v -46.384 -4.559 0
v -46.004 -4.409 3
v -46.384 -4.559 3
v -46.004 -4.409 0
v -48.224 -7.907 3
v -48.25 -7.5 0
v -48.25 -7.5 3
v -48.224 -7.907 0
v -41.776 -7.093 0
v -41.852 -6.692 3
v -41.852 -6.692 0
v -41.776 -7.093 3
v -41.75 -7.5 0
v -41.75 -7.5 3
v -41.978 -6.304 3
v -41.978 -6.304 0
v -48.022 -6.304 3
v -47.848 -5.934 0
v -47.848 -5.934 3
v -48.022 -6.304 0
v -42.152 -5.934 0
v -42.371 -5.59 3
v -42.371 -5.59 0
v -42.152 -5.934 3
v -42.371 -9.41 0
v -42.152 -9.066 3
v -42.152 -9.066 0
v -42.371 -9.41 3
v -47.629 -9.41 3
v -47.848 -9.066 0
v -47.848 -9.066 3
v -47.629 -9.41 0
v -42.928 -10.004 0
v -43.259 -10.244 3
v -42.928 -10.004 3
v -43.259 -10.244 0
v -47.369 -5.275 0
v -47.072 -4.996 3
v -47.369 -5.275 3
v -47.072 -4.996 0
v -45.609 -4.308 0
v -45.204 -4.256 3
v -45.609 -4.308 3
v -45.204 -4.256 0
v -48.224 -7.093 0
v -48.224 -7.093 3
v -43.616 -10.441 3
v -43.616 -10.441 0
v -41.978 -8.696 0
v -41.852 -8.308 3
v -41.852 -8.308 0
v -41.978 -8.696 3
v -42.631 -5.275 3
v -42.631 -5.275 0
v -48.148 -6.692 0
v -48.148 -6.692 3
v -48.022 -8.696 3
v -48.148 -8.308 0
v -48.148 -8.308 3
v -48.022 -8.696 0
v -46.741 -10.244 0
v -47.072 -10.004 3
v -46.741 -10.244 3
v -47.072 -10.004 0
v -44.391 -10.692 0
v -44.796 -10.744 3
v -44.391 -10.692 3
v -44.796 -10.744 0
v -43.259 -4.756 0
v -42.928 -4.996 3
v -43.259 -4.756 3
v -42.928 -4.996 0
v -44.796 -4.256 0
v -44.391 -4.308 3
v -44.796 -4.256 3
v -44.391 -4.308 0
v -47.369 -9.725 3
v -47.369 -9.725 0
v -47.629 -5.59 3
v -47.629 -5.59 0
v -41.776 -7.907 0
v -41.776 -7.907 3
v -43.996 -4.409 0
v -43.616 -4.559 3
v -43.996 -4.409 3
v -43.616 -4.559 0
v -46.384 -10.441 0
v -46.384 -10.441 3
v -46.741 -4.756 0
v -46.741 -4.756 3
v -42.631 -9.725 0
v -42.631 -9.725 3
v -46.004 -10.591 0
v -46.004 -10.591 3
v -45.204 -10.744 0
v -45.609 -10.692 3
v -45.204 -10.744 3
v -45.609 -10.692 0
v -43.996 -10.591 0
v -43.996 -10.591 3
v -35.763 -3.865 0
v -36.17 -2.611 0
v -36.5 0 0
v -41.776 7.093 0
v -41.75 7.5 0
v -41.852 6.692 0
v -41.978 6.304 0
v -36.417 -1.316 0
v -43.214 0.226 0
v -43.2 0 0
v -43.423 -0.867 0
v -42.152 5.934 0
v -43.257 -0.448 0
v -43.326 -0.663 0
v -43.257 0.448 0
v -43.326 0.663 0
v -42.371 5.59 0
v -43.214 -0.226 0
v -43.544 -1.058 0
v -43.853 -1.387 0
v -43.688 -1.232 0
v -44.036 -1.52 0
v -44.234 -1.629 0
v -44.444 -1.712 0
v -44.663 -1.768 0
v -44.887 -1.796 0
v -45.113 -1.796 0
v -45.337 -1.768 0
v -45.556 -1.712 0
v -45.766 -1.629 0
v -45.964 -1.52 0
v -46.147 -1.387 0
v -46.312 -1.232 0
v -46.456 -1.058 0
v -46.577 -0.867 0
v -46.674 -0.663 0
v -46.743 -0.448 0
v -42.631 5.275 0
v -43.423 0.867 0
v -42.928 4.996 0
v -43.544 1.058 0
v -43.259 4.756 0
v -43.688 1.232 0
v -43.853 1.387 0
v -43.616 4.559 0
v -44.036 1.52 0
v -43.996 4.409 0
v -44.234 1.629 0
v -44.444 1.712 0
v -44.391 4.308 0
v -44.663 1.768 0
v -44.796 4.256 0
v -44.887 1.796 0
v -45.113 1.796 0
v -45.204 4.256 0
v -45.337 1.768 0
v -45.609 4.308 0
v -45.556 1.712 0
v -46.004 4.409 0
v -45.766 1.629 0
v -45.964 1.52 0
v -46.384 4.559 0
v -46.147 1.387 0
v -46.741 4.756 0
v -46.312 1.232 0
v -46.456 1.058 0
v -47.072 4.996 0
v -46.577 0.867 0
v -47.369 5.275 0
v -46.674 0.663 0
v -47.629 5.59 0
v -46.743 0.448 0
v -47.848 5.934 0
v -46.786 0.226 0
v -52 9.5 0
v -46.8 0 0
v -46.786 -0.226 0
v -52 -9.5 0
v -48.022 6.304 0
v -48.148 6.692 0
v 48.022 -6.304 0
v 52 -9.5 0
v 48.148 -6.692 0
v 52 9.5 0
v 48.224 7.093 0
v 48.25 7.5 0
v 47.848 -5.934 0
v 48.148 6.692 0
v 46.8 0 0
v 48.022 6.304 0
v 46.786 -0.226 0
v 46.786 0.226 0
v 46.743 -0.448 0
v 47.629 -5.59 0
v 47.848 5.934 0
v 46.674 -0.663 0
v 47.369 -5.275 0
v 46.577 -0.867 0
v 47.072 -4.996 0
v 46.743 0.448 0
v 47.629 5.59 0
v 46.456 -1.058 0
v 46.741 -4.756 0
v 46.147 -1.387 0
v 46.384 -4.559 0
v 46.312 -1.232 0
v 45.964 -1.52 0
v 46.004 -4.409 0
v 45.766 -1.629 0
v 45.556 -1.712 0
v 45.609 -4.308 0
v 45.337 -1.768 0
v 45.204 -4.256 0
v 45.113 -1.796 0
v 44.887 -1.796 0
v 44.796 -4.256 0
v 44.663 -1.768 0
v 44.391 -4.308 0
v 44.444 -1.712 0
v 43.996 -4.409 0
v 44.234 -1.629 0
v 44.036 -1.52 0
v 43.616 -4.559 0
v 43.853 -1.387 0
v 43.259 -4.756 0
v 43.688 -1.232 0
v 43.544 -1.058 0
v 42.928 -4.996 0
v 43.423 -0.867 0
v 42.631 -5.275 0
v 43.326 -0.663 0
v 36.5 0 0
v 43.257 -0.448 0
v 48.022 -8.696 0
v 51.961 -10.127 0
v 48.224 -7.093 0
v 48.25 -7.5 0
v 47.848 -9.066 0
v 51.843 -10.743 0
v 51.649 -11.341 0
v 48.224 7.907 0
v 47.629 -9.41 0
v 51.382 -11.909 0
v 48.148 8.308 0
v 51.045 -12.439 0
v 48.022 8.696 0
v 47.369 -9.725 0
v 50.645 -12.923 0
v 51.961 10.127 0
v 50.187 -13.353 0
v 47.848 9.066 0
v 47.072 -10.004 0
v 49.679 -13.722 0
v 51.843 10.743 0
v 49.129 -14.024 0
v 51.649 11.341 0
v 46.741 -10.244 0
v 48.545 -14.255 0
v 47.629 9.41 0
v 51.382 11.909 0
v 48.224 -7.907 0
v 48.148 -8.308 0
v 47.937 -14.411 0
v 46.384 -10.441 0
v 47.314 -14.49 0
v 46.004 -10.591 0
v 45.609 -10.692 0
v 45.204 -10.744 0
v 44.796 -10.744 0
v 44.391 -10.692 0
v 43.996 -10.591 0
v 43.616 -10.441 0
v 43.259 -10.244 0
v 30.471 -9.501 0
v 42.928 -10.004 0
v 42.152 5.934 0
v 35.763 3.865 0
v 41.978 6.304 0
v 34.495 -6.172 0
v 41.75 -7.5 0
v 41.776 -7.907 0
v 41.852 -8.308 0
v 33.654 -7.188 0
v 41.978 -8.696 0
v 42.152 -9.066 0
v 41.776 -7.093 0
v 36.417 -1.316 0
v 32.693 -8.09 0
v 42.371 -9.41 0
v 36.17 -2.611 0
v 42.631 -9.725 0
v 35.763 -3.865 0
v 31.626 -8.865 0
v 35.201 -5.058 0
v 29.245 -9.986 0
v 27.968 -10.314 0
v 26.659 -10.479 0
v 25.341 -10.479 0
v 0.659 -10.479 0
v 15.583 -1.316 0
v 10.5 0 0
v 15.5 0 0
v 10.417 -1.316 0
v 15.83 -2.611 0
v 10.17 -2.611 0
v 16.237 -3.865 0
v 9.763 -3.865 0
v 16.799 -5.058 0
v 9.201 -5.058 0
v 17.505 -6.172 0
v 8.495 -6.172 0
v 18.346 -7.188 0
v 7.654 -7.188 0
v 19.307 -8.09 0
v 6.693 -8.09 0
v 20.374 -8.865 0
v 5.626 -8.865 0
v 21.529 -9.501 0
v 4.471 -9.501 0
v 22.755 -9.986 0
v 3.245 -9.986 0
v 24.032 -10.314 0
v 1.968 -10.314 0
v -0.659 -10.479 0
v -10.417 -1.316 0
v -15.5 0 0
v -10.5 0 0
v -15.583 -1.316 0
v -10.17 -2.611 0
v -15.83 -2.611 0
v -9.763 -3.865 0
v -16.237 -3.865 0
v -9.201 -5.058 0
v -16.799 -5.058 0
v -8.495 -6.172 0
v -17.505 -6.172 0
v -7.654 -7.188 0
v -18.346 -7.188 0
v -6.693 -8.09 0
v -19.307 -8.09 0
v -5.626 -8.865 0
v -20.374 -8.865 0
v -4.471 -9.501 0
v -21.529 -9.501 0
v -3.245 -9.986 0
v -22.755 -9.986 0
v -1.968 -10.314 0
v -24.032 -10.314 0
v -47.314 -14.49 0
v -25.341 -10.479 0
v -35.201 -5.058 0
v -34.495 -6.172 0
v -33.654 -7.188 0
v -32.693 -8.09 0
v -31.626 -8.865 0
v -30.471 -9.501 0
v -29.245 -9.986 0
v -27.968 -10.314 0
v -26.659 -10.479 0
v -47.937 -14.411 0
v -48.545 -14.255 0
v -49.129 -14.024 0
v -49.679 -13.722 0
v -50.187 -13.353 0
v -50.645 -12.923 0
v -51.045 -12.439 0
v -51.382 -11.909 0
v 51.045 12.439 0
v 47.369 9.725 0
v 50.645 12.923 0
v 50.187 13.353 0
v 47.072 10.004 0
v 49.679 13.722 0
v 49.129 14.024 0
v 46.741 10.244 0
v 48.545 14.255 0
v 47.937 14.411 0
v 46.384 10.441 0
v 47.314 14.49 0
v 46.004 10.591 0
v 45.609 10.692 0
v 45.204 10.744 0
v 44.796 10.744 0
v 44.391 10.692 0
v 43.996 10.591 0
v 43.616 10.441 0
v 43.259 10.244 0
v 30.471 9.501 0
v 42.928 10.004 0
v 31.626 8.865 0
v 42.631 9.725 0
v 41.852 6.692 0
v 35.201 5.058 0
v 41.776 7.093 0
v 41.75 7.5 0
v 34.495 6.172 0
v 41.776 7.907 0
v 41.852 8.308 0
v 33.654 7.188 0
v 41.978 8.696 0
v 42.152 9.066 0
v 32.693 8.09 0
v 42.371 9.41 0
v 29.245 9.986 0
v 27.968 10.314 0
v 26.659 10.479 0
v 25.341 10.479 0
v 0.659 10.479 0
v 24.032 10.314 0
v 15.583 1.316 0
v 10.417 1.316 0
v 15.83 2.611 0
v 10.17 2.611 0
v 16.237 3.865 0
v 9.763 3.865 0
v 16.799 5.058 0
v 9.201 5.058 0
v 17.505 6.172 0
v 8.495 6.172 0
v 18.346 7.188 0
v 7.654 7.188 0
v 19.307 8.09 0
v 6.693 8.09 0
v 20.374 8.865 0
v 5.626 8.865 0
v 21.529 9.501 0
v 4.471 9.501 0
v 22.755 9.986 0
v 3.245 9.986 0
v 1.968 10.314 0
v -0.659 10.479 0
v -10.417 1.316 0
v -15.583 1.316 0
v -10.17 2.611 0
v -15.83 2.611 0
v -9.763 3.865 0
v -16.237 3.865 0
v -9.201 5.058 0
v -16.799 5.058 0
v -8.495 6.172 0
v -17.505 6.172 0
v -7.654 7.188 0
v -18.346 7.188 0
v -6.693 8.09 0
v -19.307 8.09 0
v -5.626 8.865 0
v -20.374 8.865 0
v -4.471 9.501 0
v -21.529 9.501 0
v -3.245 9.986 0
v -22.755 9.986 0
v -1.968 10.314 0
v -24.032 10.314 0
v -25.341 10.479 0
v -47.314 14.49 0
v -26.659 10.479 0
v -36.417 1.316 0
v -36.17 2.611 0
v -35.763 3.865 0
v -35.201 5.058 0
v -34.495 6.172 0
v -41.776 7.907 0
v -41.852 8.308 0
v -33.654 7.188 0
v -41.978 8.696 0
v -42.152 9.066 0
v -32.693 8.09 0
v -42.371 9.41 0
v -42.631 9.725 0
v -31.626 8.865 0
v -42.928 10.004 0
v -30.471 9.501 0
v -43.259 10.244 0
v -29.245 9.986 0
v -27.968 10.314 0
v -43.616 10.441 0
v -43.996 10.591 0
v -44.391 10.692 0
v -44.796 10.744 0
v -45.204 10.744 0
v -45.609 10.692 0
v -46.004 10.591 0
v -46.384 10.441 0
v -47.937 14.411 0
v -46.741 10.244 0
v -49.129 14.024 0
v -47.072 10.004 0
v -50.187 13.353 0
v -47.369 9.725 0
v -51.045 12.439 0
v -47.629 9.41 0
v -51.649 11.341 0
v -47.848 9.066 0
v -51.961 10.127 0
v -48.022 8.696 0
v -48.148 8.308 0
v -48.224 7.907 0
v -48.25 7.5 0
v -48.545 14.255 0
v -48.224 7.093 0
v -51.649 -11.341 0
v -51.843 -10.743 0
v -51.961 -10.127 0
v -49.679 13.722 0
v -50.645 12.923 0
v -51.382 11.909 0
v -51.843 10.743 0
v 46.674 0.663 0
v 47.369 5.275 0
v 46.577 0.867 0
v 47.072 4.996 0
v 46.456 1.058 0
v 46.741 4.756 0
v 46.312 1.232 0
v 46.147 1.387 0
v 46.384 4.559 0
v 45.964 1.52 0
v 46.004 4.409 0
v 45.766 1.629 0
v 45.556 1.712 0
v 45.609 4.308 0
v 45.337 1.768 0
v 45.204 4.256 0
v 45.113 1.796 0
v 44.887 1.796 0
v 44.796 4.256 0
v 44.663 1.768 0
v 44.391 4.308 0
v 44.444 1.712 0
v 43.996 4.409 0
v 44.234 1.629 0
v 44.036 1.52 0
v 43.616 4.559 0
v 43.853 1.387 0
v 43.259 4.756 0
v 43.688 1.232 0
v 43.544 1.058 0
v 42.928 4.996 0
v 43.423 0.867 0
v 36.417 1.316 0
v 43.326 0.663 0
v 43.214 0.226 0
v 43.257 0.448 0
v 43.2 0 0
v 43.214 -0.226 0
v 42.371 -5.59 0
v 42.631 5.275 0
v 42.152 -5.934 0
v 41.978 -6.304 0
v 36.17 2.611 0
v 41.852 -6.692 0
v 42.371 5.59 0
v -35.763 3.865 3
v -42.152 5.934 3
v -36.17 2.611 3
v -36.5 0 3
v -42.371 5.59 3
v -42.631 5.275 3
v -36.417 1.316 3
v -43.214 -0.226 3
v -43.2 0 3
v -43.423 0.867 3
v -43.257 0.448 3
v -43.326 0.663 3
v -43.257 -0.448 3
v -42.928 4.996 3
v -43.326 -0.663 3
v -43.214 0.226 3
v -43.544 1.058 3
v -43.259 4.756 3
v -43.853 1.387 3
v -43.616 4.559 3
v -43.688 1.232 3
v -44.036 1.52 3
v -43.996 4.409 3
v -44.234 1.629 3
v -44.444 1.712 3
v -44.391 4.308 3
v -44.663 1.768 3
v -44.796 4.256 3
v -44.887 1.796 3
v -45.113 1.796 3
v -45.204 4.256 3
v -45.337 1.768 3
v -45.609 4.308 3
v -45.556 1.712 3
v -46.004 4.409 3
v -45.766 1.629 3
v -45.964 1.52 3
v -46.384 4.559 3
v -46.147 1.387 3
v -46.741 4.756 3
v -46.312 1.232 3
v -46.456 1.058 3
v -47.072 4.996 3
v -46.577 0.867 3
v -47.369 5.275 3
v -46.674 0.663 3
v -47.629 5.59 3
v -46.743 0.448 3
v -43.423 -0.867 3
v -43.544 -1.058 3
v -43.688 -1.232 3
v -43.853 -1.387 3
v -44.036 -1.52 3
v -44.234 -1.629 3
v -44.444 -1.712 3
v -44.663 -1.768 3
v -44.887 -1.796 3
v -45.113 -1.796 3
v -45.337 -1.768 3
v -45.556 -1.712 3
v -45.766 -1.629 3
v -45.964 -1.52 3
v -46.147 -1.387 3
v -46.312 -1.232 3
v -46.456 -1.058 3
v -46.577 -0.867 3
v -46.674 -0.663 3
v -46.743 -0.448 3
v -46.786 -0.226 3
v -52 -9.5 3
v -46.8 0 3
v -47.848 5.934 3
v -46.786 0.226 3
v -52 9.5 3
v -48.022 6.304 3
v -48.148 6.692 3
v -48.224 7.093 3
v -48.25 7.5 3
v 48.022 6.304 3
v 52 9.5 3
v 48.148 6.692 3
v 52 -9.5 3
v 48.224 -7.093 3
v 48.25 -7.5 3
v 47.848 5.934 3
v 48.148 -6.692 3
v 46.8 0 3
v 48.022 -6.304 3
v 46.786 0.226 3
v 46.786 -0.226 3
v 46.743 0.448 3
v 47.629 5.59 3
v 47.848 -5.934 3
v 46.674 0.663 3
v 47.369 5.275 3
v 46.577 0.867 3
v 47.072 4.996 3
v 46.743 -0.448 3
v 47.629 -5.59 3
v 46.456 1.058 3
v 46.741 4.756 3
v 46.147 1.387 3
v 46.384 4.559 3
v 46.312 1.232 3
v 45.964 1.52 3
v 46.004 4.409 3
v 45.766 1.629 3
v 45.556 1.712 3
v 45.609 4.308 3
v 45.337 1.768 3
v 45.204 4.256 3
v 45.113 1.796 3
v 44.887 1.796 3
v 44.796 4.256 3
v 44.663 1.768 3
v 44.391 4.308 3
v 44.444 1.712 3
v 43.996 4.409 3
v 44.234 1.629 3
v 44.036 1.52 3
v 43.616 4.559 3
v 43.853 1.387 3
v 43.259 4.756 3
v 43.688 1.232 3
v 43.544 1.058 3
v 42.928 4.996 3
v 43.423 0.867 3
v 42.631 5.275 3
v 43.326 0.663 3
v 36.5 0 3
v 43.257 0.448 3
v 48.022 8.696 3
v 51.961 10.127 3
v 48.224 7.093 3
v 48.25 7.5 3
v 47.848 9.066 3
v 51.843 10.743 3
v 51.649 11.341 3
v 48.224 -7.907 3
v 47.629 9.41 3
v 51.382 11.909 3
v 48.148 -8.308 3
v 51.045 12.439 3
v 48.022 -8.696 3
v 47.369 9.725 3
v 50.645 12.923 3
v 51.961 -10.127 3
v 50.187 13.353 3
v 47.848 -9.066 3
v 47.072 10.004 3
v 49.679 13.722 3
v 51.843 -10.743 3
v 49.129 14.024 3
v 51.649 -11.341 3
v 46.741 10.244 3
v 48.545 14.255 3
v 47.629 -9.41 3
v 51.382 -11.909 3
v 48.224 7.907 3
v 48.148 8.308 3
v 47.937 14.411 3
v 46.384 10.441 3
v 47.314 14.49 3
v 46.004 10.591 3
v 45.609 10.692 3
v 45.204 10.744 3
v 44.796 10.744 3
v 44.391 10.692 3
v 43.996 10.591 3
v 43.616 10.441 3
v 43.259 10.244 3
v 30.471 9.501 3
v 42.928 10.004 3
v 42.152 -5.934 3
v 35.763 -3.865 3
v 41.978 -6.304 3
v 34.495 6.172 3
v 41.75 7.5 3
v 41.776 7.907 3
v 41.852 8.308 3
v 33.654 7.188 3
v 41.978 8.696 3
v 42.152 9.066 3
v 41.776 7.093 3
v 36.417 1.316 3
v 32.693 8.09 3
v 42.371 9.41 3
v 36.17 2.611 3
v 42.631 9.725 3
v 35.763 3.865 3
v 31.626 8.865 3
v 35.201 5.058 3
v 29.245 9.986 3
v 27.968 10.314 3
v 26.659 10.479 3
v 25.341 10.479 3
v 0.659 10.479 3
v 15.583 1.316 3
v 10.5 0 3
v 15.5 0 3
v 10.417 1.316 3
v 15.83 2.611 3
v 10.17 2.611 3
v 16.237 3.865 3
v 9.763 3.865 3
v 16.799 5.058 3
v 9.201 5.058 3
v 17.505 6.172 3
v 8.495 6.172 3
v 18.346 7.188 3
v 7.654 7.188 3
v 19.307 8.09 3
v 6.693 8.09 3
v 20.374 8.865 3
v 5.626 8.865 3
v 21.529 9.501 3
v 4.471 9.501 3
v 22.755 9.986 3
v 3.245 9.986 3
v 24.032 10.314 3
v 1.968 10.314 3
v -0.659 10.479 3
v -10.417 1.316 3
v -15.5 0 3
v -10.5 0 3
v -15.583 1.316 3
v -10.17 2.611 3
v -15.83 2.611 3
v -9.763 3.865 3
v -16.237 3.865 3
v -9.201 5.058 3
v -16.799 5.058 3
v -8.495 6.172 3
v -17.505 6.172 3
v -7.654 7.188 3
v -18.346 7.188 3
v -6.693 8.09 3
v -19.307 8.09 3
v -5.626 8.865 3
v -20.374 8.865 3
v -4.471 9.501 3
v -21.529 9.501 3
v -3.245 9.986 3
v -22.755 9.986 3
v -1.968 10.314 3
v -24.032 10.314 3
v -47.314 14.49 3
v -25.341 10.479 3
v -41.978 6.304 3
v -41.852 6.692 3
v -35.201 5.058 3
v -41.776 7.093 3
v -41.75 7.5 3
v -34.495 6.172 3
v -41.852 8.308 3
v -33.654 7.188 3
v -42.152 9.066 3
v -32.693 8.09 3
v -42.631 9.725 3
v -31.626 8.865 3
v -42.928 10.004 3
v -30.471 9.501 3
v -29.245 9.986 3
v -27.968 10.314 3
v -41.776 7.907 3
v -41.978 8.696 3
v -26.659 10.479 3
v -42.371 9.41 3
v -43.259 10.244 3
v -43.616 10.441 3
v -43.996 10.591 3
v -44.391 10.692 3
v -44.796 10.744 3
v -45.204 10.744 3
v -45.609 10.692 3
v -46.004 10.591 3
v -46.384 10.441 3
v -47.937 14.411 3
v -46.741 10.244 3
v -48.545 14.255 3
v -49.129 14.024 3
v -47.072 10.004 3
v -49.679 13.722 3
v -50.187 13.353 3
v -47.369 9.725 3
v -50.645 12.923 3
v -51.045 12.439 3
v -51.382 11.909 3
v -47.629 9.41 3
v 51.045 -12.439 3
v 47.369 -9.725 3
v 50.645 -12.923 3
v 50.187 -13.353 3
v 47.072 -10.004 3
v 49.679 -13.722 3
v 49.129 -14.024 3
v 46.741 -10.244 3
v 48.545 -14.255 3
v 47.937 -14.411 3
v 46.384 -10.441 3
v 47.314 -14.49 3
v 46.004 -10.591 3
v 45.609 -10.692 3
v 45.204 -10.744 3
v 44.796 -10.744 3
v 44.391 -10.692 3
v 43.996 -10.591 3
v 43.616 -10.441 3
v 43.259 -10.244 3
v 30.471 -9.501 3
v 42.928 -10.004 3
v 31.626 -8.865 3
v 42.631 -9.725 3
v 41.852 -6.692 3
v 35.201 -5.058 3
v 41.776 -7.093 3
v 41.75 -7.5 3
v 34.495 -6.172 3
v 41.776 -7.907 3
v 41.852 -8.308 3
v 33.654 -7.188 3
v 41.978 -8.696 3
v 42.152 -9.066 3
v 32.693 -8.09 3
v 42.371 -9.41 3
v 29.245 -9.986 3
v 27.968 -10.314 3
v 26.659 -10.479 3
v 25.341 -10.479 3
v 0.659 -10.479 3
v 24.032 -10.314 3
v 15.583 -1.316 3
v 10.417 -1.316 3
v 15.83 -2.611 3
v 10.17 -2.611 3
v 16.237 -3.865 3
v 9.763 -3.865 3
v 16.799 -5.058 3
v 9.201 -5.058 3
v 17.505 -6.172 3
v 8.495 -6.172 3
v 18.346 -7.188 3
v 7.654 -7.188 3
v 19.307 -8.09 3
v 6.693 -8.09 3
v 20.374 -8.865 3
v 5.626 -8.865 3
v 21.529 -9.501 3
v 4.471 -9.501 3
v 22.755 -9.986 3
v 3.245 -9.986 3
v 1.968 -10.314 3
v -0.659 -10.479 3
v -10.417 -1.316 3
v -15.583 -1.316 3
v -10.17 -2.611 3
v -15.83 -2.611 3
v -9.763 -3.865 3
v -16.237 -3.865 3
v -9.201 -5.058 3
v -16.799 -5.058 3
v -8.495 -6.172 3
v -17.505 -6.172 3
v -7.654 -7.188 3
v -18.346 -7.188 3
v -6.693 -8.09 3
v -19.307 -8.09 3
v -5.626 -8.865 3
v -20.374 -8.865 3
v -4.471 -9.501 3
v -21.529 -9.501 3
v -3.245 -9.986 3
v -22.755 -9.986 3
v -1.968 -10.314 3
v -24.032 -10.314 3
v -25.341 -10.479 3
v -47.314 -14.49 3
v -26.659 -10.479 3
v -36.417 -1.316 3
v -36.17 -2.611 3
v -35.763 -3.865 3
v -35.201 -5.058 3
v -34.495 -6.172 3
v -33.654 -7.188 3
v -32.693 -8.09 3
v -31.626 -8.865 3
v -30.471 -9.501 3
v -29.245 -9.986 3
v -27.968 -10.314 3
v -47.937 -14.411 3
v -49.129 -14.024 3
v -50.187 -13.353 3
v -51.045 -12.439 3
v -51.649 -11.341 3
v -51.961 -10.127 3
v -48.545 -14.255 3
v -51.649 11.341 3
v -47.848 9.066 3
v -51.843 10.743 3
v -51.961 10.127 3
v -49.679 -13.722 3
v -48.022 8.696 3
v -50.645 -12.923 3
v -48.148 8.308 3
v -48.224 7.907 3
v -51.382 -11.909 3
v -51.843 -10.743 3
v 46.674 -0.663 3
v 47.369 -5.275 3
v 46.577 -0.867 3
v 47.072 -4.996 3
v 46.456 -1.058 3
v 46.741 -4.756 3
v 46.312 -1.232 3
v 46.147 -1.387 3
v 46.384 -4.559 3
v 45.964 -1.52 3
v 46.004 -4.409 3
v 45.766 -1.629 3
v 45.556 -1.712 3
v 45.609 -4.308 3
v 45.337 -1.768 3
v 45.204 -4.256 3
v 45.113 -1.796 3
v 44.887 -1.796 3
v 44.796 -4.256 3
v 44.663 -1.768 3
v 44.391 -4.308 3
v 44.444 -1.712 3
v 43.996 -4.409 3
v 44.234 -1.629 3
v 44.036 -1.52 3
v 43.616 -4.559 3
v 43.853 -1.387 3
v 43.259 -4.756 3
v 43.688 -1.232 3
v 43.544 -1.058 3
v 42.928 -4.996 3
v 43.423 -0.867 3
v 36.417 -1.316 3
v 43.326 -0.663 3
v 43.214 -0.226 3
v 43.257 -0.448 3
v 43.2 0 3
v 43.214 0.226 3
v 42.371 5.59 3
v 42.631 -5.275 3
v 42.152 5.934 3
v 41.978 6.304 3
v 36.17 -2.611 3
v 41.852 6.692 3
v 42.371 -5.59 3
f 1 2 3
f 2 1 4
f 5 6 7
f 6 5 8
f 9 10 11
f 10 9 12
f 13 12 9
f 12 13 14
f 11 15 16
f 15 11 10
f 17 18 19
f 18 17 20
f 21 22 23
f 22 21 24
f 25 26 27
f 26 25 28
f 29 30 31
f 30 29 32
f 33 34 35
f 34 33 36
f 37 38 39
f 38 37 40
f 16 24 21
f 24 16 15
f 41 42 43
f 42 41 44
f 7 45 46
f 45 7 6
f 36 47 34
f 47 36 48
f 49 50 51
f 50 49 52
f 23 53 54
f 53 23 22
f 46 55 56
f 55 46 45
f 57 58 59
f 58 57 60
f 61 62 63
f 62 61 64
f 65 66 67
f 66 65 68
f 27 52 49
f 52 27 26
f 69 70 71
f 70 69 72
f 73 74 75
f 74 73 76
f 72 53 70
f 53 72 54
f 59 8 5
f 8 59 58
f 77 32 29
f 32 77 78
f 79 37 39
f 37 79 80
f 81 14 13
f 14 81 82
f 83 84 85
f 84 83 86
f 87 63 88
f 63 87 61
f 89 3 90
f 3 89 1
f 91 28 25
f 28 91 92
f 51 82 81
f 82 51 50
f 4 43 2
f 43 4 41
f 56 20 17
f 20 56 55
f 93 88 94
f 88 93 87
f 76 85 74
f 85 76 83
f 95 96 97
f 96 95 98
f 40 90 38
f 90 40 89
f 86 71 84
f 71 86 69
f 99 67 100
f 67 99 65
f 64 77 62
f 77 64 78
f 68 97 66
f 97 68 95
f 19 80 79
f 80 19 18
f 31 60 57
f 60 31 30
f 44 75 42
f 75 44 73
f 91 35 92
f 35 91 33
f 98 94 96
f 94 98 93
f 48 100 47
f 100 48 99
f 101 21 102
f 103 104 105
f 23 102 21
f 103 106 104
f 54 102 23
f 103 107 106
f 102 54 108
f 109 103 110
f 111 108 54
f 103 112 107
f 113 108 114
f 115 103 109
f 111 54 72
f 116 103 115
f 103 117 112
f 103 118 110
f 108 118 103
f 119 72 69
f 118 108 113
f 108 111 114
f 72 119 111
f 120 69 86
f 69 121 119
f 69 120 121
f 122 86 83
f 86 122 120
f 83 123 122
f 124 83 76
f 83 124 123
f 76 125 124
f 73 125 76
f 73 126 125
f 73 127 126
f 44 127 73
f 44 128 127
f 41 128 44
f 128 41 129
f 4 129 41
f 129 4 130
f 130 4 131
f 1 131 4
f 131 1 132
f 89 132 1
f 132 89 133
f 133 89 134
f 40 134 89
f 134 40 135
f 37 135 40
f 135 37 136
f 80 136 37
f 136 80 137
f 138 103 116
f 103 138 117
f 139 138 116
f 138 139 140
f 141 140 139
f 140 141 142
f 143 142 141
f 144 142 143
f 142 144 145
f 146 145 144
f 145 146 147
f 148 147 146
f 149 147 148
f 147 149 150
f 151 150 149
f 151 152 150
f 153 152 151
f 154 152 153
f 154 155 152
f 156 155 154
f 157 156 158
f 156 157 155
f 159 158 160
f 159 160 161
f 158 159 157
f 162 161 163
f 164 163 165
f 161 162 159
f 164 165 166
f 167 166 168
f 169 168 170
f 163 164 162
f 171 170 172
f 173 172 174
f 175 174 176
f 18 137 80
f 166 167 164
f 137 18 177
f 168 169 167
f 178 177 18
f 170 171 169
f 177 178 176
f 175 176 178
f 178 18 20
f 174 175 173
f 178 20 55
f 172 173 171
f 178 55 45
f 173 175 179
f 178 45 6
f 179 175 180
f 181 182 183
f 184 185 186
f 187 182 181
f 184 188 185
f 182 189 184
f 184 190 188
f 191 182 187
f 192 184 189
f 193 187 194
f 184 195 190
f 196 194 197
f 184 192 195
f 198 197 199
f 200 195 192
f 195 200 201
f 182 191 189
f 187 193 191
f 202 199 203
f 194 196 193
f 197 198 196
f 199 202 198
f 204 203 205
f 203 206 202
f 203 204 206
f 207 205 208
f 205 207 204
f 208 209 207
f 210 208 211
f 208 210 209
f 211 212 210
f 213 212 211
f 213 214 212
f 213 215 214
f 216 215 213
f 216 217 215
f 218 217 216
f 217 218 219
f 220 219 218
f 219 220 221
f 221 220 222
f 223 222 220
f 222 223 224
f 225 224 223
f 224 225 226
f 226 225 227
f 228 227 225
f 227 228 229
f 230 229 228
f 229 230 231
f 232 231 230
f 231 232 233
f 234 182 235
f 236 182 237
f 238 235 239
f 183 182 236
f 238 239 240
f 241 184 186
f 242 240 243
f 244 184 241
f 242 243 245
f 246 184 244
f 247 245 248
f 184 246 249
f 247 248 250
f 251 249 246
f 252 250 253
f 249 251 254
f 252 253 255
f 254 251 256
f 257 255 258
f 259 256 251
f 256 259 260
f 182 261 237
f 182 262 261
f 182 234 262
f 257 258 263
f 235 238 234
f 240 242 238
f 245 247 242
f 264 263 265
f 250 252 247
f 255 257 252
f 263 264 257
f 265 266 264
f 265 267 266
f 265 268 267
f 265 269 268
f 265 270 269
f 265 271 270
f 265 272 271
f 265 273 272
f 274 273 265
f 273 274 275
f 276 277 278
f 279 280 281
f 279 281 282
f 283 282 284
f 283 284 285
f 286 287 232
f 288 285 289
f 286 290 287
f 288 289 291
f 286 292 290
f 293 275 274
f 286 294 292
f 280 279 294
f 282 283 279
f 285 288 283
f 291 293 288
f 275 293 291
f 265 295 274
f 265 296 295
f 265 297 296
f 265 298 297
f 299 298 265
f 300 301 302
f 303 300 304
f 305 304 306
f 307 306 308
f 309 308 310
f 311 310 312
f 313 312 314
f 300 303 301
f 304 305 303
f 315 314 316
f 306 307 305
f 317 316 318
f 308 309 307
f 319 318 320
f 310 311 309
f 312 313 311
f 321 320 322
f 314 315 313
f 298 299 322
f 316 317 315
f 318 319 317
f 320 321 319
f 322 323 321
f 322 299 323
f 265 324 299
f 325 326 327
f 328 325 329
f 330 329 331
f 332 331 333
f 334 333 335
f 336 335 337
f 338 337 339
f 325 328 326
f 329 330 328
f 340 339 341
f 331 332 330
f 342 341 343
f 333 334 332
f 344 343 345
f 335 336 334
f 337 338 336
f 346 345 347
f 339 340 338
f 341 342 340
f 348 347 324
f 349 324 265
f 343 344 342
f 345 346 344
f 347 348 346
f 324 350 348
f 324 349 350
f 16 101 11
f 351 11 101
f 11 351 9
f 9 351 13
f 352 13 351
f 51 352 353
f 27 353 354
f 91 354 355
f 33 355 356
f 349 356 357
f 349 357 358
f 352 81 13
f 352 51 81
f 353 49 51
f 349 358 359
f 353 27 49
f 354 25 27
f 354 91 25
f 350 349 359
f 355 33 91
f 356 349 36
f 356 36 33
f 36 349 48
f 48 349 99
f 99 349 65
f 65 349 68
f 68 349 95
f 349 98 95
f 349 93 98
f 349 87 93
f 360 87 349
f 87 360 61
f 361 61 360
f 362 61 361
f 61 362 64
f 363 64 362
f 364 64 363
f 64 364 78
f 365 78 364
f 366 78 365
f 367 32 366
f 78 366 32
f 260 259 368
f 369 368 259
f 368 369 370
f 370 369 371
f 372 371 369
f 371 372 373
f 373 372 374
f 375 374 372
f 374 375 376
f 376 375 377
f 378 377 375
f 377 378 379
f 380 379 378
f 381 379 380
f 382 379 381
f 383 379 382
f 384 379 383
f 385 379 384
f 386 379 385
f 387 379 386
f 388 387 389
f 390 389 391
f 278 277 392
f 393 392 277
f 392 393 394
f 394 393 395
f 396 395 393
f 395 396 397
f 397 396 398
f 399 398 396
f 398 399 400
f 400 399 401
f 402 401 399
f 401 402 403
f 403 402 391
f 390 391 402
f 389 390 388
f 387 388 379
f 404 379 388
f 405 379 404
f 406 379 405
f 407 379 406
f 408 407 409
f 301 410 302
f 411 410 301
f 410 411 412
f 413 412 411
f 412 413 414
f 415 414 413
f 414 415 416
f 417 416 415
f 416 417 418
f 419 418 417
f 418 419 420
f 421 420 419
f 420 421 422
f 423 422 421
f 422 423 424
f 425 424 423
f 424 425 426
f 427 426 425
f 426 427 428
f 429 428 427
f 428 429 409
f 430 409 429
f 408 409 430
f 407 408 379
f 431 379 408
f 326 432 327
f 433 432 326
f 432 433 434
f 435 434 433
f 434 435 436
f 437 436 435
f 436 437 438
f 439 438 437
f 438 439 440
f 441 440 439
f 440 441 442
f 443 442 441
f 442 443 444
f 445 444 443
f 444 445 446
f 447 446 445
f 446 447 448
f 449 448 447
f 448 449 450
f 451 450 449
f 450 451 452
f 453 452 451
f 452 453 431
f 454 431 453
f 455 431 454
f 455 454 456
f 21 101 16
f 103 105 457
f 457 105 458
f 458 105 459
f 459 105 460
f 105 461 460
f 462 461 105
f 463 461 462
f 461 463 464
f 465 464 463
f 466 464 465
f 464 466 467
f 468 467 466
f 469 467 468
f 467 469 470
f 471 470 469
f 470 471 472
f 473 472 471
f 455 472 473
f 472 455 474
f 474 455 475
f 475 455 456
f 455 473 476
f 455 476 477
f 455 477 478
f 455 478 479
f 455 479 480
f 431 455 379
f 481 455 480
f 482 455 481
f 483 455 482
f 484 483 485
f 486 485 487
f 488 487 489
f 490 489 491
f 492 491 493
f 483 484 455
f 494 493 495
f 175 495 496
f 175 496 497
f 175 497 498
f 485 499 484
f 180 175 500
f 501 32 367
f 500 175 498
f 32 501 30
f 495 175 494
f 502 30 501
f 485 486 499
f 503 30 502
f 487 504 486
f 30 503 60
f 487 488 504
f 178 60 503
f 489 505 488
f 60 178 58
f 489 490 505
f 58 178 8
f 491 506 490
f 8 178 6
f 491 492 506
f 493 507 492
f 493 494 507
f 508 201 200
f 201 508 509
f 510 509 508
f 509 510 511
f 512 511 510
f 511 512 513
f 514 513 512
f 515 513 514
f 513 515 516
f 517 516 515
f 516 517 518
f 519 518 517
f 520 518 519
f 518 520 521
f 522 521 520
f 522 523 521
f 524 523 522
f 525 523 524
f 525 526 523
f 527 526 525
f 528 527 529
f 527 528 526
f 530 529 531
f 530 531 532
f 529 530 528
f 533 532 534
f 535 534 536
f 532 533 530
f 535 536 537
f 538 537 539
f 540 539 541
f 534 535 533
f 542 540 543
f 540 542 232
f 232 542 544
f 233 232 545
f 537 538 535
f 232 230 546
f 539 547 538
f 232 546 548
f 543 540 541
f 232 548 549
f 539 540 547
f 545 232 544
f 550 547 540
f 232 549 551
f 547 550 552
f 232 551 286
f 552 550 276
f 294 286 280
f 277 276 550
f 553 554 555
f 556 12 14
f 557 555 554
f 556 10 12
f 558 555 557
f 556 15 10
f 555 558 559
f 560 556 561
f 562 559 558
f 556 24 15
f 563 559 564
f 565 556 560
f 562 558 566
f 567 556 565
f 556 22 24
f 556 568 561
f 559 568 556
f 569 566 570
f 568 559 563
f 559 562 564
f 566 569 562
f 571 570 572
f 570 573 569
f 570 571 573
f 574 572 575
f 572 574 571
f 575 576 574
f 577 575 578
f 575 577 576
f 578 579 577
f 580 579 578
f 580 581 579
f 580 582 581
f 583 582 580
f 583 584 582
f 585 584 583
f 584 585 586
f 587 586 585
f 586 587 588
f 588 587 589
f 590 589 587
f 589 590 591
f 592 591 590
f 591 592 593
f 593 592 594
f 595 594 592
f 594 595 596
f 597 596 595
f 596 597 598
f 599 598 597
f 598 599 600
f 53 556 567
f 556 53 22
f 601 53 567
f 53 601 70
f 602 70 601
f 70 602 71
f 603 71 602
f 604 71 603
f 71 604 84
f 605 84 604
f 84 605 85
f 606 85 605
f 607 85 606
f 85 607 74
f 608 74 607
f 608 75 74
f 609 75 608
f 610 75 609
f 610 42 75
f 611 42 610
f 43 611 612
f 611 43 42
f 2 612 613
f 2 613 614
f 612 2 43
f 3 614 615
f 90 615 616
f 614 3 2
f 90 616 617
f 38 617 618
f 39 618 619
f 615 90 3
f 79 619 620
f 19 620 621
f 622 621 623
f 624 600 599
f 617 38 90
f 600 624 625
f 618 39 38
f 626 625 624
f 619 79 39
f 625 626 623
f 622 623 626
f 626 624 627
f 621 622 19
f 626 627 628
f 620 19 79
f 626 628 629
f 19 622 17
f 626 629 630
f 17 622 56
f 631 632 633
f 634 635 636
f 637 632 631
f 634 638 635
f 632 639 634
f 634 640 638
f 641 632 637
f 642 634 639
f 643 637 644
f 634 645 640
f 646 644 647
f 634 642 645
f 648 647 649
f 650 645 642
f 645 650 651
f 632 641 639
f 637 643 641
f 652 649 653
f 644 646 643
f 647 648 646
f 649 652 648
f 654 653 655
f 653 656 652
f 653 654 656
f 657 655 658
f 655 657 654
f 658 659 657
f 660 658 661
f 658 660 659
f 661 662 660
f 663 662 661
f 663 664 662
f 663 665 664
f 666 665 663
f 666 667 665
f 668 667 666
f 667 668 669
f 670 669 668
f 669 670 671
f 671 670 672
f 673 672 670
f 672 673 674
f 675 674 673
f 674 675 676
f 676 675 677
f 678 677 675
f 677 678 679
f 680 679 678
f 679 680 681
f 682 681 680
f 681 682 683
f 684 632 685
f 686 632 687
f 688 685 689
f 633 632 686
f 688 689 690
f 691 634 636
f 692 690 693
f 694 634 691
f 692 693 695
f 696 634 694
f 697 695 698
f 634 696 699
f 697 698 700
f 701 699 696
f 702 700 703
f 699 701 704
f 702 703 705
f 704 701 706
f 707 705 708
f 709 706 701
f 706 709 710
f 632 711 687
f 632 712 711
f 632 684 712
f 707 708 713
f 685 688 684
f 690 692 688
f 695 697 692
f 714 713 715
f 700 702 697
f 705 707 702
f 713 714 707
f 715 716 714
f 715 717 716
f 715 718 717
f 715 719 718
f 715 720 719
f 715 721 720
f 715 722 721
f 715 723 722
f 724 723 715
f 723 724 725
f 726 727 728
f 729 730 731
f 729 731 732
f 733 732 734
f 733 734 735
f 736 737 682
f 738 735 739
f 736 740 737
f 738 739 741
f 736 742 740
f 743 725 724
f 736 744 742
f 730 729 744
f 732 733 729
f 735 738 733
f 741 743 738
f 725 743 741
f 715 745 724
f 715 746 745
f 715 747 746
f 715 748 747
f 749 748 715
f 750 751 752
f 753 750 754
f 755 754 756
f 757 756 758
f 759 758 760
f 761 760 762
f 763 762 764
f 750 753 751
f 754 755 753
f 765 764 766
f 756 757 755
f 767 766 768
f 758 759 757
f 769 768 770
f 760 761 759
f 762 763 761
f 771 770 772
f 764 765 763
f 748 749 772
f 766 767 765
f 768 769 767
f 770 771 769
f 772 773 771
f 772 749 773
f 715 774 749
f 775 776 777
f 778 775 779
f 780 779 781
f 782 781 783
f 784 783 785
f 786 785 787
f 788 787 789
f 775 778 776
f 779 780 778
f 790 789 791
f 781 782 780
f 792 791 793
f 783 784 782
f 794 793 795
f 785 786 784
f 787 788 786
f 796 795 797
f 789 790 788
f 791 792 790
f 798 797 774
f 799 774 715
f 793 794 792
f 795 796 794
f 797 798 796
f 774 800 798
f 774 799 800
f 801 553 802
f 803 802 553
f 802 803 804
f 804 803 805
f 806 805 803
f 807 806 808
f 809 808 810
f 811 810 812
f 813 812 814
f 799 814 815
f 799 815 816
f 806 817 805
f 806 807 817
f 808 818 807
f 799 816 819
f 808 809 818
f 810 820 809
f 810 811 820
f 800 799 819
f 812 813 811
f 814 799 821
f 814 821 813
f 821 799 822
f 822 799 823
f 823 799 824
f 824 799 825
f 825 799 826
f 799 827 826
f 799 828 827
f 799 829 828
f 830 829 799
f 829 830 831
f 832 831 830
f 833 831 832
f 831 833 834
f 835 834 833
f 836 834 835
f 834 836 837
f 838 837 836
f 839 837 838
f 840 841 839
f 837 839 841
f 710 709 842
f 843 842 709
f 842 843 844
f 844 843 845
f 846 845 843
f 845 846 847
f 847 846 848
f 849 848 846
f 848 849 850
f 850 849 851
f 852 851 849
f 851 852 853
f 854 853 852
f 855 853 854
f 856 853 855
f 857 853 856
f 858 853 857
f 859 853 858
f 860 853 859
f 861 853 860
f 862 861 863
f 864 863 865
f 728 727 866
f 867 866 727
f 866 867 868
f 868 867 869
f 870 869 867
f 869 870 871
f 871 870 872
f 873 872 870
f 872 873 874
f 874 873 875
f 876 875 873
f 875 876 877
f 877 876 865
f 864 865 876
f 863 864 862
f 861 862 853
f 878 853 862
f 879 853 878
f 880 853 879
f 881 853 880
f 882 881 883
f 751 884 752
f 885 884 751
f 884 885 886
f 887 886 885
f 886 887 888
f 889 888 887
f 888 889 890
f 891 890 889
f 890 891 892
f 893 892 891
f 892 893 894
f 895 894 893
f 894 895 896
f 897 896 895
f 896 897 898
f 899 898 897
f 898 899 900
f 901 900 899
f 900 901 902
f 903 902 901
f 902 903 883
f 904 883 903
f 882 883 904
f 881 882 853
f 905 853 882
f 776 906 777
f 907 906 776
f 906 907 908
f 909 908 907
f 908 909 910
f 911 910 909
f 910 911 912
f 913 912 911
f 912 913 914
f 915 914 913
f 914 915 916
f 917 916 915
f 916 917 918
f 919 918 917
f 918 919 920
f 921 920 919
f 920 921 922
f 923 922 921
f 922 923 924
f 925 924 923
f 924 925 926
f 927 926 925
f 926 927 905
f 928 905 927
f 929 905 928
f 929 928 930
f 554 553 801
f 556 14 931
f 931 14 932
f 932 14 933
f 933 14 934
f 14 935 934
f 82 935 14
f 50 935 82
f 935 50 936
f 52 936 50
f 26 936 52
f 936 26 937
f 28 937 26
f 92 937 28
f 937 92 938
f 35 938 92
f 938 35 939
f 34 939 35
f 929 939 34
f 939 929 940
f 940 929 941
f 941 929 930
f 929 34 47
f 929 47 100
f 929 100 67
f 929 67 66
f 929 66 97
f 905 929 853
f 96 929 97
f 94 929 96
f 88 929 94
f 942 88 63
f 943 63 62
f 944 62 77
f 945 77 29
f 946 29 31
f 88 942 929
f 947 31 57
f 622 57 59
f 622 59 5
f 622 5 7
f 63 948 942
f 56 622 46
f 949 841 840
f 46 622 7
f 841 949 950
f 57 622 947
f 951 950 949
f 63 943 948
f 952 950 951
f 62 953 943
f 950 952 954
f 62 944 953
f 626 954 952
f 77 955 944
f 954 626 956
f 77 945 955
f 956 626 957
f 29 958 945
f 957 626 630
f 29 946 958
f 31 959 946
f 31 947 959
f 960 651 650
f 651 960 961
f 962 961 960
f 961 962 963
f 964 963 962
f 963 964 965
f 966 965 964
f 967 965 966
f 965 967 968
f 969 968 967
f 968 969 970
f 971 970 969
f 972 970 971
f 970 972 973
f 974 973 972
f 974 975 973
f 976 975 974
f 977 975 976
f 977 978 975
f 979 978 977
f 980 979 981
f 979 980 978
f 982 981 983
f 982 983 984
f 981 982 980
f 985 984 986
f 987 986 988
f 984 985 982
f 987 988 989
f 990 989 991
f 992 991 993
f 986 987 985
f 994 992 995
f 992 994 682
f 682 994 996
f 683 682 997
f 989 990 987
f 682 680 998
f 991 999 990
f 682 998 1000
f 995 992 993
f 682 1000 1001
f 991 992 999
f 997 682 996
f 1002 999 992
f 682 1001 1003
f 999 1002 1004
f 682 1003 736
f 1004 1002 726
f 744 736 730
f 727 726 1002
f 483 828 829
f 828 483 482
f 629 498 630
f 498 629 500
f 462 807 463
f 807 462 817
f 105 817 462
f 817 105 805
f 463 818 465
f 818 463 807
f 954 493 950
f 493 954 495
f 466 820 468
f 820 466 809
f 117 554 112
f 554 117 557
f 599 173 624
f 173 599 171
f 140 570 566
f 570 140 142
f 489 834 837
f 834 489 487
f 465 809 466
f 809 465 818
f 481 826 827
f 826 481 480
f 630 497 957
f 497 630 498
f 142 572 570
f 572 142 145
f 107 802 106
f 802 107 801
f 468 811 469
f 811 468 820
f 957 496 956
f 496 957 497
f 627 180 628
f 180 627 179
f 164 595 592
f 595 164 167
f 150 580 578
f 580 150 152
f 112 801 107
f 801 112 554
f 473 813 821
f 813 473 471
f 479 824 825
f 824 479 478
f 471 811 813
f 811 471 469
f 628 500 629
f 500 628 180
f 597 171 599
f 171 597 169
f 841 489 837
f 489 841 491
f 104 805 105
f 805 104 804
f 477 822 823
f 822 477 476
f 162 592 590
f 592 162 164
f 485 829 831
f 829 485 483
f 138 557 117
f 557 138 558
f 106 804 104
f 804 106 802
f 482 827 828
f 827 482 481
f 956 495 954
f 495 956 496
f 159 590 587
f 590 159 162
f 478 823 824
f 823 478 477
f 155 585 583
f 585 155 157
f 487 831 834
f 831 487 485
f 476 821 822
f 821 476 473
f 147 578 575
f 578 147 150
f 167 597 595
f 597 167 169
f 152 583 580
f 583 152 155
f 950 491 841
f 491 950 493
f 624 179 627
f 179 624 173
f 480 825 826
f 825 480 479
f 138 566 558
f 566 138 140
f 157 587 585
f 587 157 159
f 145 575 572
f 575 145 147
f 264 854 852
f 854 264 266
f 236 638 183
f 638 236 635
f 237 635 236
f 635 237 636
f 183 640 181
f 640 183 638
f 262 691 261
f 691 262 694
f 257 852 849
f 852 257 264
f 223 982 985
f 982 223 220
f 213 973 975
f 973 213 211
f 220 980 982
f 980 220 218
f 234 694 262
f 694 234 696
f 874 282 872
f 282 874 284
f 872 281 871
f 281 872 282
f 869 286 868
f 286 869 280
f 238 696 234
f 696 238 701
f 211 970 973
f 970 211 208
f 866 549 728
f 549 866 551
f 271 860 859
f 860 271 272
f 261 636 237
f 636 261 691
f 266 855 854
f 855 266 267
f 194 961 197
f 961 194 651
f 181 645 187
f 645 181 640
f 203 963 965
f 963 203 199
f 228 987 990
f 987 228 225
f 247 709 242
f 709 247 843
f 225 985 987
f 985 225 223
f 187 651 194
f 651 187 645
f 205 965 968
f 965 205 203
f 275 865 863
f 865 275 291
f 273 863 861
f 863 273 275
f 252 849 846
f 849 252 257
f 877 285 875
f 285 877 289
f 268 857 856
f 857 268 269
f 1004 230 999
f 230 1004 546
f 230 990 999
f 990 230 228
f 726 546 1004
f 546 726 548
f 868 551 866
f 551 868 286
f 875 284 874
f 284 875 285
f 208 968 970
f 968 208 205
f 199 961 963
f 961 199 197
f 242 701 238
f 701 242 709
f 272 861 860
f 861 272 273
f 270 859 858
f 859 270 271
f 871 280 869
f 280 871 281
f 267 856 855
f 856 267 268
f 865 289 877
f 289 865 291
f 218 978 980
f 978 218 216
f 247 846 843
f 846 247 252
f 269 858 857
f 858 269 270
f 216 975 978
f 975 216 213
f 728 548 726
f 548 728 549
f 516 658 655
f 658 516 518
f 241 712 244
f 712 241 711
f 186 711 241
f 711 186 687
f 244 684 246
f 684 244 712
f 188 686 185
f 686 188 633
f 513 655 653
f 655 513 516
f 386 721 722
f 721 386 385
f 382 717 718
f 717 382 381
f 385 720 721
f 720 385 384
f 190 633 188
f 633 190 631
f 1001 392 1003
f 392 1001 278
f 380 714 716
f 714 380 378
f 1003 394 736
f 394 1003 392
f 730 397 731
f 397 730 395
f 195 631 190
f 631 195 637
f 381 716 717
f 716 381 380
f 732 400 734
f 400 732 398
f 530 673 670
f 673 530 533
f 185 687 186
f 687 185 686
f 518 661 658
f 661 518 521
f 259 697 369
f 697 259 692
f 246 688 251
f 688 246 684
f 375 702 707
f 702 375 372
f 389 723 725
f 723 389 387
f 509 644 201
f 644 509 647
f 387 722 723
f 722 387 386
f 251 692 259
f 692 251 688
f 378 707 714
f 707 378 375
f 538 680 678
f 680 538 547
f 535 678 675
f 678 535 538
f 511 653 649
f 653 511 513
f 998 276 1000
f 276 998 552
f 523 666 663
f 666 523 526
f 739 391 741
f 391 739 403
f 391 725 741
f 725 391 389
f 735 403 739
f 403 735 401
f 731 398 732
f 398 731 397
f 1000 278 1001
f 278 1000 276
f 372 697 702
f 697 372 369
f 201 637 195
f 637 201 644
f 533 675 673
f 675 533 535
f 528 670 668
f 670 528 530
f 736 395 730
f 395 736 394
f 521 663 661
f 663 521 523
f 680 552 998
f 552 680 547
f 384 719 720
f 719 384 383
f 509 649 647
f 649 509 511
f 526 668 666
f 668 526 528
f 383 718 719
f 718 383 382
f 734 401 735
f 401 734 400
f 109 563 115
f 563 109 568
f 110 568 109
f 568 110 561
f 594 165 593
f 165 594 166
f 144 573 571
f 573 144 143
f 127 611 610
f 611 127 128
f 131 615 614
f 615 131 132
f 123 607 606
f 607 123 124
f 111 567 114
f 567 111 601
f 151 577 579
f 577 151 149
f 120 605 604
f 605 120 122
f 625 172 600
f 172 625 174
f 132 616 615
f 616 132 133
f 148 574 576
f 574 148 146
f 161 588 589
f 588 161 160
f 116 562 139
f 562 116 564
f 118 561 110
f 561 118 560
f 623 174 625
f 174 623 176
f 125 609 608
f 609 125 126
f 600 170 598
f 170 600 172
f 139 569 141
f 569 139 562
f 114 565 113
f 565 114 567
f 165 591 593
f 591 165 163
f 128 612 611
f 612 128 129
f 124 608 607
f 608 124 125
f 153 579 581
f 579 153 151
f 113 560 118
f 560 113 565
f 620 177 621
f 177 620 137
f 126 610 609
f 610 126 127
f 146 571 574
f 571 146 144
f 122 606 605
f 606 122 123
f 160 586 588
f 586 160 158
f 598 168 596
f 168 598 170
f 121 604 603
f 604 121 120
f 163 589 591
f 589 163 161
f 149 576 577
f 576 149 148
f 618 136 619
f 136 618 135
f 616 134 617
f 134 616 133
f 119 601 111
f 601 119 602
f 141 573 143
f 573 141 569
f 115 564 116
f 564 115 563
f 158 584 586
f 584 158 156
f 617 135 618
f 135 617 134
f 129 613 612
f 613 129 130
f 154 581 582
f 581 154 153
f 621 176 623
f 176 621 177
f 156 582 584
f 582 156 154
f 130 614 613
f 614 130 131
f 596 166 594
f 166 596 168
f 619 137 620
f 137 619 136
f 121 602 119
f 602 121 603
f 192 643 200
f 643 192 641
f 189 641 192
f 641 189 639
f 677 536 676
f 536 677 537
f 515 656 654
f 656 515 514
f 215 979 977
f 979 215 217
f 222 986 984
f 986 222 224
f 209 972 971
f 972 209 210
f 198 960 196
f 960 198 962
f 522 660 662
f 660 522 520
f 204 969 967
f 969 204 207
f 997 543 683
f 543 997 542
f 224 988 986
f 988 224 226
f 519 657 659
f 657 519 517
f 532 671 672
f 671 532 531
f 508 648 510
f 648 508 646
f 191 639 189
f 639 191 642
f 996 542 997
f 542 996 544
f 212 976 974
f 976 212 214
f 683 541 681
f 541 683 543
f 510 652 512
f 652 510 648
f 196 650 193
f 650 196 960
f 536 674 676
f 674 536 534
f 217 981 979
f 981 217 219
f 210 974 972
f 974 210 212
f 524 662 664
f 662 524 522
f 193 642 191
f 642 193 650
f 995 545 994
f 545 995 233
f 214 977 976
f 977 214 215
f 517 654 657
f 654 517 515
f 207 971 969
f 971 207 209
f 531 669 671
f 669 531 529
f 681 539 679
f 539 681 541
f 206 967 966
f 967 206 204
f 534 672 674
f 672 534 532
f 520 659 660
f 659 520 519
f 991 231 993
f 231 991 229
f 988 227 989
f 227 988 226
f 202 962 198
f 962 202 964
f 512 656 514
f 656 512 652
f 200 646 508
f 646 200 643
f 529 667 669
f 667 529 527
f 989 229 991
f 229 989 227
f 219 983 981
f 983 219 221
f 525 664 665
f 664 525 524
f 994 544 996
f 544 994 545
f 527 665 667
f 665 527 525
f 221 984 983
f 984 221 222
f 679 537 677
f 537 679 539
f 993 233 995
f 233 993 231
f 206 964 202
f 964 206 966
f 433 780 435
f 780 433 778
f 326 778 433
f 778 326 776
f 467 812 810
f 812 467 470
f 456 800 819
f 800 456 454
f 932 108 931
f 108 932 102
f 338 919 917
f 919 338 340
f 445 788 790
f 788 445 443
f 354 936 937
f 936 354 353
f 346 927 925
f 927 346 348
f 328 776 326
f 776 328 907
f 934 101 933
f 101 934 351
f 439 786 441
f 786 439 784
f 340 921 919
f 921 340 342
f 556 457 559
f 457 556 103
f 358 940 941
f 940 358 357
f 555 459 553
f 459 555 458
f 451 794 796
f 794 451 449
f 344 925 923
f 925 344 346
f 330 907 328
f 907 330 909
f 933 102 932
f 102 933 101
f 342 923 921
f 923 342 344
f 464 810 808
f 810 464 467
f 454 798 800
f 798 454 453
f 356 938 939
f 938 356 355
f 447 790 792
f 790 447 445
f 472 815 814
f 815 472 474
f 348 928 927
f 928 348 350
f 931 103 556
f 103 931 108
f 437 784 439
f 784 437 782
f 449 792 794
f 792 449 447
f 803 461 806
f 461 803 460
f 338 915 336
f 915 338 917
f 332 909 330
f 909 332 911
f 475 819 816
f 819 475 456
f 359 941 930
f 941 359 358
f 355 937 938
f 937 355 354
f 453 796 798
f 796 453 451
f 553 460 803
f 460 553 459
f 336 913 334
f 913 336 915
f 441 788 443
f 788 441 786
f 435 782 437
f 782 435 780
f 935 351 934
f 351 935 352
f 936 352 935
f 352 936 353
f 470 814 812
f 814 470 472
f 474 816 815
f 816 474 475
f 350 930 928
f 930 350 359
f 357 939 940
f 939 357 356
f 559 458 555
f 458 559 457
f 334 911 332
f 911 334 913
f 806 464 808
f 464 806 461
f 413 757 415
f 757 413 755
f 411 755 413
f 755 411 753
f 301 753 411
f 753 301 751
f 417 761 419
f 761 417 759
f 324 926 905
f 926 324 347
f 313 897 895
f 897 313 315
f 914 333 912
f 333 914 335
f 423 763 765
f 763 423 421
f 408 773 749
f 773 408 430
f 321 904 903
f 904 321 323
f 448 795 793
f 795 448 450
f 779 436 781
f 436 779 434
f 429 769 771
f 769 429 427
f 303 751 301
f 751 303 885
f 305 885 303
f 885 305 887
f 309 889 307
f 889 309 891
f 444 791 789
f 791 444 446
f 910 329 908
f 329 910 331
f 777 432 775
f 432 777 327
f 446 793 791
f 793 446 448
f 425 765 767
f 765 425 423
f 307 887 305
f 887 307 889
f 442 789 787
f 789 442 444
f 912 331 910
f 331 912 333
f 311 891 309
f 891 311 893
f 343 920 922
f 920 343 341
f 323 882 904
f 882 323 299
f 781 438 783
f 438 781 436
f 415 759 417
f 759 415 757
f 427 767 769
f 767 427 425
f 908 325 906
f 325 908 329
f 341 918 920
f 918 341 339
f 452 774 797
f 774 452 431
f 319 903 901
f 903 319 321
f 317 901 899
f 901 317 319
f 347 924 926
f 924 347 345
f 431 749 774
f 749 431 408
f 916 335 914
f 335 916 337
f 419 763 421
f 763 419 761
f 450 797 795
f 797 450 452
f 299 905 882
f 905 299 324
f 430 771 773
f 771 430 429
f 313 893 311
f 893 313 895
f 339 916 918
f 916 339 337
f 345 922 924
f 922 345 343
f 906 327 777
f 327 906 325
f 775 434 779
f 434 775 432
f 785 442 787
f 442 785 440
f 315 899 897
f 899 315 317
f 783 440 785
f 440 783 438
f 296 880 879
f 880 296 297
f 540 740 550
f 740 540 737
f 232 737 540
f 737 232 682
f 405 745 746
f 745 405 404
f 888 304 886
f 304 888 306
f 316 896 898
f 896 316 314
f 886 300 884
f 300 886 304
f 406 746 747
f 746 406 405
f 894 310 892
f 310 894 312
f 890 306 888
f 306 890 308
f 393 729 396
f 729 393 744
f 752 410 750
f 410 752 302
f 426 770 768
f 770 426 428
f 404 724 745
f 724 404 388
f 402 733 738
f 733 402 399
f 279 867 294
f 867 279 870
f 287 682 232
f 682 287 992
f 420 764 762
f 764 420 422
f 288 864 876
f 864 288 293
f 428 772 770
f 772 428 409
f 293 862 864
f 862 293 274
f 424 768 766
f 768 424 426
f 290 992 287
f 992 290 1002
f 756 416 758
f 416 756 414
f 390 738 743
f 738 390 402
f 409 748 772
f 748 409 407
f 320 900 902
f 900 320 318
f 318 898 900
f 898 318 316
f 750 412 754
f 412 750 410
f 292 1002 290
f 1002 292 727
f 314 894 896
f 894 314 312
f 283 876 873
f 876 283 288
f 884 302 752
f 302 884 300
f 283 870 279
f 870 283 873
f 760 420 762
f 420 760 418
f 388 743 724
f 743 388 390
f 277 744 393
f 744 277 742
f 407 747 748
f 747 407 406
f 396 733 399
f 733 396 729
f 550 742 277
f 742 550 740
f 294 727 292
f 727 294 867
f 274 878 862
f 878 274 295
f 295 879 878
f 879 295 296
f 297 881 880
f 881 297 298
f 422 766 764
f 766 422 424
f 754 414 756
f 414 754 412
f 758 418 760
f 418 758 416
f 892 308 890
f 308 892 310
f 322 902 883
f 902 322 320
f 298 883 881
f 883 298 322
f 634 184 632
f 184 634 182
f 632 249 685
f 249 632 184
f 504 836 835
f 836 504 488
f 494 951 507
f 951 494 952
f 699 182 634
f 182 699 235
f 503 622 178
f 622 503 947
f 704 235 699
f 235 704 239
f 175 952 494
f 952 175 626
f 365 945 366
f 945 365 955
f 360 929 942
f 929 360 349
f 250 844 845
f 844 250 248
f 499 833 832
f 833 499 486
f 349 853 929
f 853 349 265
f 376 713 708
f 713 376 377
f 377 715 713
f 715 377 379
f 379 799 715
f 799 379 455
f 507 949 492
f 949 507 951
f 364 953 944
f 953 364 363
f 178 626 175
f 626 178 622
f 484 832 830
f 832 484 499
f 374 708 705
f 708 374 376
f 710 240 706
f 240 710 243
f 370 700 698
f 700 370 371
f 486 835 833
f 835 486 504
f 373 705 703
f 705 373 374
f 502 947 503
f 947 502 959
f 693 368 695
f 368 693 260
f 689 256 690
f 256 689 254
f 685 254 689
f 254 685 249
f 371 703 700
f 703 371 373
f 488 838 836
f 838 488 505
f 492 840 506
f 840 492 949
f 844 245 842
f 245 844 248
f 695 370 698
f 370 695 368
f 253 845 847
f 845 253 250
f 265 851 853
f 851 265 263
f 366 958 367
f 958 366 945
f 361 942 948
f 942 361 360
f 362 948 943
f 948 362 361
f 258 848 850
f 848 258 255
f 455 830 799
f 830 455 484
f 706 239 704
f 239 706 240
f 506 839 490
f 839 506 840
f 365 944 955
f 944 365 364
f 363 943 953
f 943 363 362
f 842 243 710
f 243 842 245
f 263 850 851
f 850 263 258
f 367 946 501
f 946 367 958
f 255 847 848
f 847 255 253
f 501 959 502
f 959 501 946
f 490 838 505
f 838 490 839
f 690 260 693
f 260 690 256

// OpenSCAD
$fn = 50;

difference() {
	union() {
		hull() {
			translate(v = [-47.0, 9.5, 0]) {
				cylinder(h = 3, r = 5);
			}
			translate(v = [47.0, 9.5, 0]) {
				cylinder(h = 3, r = 5);
			}
			translate(v = [-47.0, -9.5, 0]) {
				cylinder(h = 3, r = 5);
			}
			translate(v = [47.0, -9.5, 0]) {
				cylinder(h = 3, r = 5);
			}
		}
	}
	union() {
		translate(v = [-45.0, -7.5, 0]) {
			cylinder(h = 3, r = 3.25);
		}
		translate(v = [-45.0, 7.5, 0]) {
			cylinder(h = 3, r = 3.25);
		}
		translate(v = [45.0, -7.5, 0]) {
			cylinder(h = 3, r = 3.25);
		}
		translate(v = [45.0, 7.5, 0]) {
			cylinder(h = 3, r = 3.25);
		}
		translate(v = [-45.0, 0.0, 0]) {
			cylinder(h = 3, r = 1.8);
		}
		translate(v = [45.0, 0.0, 0]) {
			cylinder(h = 3, r = 1.8);
		}
		translate(v = [-26.0, 0, 0.0]) {
			cylinder(h = 3, r = 10.5);
		}
		cylinder(h = 3, r = 10.5);
		translate(v = [26.0, 0, 0.0]) {
			cylinder(h = 3, r = 10.5);
		}
	}
}
